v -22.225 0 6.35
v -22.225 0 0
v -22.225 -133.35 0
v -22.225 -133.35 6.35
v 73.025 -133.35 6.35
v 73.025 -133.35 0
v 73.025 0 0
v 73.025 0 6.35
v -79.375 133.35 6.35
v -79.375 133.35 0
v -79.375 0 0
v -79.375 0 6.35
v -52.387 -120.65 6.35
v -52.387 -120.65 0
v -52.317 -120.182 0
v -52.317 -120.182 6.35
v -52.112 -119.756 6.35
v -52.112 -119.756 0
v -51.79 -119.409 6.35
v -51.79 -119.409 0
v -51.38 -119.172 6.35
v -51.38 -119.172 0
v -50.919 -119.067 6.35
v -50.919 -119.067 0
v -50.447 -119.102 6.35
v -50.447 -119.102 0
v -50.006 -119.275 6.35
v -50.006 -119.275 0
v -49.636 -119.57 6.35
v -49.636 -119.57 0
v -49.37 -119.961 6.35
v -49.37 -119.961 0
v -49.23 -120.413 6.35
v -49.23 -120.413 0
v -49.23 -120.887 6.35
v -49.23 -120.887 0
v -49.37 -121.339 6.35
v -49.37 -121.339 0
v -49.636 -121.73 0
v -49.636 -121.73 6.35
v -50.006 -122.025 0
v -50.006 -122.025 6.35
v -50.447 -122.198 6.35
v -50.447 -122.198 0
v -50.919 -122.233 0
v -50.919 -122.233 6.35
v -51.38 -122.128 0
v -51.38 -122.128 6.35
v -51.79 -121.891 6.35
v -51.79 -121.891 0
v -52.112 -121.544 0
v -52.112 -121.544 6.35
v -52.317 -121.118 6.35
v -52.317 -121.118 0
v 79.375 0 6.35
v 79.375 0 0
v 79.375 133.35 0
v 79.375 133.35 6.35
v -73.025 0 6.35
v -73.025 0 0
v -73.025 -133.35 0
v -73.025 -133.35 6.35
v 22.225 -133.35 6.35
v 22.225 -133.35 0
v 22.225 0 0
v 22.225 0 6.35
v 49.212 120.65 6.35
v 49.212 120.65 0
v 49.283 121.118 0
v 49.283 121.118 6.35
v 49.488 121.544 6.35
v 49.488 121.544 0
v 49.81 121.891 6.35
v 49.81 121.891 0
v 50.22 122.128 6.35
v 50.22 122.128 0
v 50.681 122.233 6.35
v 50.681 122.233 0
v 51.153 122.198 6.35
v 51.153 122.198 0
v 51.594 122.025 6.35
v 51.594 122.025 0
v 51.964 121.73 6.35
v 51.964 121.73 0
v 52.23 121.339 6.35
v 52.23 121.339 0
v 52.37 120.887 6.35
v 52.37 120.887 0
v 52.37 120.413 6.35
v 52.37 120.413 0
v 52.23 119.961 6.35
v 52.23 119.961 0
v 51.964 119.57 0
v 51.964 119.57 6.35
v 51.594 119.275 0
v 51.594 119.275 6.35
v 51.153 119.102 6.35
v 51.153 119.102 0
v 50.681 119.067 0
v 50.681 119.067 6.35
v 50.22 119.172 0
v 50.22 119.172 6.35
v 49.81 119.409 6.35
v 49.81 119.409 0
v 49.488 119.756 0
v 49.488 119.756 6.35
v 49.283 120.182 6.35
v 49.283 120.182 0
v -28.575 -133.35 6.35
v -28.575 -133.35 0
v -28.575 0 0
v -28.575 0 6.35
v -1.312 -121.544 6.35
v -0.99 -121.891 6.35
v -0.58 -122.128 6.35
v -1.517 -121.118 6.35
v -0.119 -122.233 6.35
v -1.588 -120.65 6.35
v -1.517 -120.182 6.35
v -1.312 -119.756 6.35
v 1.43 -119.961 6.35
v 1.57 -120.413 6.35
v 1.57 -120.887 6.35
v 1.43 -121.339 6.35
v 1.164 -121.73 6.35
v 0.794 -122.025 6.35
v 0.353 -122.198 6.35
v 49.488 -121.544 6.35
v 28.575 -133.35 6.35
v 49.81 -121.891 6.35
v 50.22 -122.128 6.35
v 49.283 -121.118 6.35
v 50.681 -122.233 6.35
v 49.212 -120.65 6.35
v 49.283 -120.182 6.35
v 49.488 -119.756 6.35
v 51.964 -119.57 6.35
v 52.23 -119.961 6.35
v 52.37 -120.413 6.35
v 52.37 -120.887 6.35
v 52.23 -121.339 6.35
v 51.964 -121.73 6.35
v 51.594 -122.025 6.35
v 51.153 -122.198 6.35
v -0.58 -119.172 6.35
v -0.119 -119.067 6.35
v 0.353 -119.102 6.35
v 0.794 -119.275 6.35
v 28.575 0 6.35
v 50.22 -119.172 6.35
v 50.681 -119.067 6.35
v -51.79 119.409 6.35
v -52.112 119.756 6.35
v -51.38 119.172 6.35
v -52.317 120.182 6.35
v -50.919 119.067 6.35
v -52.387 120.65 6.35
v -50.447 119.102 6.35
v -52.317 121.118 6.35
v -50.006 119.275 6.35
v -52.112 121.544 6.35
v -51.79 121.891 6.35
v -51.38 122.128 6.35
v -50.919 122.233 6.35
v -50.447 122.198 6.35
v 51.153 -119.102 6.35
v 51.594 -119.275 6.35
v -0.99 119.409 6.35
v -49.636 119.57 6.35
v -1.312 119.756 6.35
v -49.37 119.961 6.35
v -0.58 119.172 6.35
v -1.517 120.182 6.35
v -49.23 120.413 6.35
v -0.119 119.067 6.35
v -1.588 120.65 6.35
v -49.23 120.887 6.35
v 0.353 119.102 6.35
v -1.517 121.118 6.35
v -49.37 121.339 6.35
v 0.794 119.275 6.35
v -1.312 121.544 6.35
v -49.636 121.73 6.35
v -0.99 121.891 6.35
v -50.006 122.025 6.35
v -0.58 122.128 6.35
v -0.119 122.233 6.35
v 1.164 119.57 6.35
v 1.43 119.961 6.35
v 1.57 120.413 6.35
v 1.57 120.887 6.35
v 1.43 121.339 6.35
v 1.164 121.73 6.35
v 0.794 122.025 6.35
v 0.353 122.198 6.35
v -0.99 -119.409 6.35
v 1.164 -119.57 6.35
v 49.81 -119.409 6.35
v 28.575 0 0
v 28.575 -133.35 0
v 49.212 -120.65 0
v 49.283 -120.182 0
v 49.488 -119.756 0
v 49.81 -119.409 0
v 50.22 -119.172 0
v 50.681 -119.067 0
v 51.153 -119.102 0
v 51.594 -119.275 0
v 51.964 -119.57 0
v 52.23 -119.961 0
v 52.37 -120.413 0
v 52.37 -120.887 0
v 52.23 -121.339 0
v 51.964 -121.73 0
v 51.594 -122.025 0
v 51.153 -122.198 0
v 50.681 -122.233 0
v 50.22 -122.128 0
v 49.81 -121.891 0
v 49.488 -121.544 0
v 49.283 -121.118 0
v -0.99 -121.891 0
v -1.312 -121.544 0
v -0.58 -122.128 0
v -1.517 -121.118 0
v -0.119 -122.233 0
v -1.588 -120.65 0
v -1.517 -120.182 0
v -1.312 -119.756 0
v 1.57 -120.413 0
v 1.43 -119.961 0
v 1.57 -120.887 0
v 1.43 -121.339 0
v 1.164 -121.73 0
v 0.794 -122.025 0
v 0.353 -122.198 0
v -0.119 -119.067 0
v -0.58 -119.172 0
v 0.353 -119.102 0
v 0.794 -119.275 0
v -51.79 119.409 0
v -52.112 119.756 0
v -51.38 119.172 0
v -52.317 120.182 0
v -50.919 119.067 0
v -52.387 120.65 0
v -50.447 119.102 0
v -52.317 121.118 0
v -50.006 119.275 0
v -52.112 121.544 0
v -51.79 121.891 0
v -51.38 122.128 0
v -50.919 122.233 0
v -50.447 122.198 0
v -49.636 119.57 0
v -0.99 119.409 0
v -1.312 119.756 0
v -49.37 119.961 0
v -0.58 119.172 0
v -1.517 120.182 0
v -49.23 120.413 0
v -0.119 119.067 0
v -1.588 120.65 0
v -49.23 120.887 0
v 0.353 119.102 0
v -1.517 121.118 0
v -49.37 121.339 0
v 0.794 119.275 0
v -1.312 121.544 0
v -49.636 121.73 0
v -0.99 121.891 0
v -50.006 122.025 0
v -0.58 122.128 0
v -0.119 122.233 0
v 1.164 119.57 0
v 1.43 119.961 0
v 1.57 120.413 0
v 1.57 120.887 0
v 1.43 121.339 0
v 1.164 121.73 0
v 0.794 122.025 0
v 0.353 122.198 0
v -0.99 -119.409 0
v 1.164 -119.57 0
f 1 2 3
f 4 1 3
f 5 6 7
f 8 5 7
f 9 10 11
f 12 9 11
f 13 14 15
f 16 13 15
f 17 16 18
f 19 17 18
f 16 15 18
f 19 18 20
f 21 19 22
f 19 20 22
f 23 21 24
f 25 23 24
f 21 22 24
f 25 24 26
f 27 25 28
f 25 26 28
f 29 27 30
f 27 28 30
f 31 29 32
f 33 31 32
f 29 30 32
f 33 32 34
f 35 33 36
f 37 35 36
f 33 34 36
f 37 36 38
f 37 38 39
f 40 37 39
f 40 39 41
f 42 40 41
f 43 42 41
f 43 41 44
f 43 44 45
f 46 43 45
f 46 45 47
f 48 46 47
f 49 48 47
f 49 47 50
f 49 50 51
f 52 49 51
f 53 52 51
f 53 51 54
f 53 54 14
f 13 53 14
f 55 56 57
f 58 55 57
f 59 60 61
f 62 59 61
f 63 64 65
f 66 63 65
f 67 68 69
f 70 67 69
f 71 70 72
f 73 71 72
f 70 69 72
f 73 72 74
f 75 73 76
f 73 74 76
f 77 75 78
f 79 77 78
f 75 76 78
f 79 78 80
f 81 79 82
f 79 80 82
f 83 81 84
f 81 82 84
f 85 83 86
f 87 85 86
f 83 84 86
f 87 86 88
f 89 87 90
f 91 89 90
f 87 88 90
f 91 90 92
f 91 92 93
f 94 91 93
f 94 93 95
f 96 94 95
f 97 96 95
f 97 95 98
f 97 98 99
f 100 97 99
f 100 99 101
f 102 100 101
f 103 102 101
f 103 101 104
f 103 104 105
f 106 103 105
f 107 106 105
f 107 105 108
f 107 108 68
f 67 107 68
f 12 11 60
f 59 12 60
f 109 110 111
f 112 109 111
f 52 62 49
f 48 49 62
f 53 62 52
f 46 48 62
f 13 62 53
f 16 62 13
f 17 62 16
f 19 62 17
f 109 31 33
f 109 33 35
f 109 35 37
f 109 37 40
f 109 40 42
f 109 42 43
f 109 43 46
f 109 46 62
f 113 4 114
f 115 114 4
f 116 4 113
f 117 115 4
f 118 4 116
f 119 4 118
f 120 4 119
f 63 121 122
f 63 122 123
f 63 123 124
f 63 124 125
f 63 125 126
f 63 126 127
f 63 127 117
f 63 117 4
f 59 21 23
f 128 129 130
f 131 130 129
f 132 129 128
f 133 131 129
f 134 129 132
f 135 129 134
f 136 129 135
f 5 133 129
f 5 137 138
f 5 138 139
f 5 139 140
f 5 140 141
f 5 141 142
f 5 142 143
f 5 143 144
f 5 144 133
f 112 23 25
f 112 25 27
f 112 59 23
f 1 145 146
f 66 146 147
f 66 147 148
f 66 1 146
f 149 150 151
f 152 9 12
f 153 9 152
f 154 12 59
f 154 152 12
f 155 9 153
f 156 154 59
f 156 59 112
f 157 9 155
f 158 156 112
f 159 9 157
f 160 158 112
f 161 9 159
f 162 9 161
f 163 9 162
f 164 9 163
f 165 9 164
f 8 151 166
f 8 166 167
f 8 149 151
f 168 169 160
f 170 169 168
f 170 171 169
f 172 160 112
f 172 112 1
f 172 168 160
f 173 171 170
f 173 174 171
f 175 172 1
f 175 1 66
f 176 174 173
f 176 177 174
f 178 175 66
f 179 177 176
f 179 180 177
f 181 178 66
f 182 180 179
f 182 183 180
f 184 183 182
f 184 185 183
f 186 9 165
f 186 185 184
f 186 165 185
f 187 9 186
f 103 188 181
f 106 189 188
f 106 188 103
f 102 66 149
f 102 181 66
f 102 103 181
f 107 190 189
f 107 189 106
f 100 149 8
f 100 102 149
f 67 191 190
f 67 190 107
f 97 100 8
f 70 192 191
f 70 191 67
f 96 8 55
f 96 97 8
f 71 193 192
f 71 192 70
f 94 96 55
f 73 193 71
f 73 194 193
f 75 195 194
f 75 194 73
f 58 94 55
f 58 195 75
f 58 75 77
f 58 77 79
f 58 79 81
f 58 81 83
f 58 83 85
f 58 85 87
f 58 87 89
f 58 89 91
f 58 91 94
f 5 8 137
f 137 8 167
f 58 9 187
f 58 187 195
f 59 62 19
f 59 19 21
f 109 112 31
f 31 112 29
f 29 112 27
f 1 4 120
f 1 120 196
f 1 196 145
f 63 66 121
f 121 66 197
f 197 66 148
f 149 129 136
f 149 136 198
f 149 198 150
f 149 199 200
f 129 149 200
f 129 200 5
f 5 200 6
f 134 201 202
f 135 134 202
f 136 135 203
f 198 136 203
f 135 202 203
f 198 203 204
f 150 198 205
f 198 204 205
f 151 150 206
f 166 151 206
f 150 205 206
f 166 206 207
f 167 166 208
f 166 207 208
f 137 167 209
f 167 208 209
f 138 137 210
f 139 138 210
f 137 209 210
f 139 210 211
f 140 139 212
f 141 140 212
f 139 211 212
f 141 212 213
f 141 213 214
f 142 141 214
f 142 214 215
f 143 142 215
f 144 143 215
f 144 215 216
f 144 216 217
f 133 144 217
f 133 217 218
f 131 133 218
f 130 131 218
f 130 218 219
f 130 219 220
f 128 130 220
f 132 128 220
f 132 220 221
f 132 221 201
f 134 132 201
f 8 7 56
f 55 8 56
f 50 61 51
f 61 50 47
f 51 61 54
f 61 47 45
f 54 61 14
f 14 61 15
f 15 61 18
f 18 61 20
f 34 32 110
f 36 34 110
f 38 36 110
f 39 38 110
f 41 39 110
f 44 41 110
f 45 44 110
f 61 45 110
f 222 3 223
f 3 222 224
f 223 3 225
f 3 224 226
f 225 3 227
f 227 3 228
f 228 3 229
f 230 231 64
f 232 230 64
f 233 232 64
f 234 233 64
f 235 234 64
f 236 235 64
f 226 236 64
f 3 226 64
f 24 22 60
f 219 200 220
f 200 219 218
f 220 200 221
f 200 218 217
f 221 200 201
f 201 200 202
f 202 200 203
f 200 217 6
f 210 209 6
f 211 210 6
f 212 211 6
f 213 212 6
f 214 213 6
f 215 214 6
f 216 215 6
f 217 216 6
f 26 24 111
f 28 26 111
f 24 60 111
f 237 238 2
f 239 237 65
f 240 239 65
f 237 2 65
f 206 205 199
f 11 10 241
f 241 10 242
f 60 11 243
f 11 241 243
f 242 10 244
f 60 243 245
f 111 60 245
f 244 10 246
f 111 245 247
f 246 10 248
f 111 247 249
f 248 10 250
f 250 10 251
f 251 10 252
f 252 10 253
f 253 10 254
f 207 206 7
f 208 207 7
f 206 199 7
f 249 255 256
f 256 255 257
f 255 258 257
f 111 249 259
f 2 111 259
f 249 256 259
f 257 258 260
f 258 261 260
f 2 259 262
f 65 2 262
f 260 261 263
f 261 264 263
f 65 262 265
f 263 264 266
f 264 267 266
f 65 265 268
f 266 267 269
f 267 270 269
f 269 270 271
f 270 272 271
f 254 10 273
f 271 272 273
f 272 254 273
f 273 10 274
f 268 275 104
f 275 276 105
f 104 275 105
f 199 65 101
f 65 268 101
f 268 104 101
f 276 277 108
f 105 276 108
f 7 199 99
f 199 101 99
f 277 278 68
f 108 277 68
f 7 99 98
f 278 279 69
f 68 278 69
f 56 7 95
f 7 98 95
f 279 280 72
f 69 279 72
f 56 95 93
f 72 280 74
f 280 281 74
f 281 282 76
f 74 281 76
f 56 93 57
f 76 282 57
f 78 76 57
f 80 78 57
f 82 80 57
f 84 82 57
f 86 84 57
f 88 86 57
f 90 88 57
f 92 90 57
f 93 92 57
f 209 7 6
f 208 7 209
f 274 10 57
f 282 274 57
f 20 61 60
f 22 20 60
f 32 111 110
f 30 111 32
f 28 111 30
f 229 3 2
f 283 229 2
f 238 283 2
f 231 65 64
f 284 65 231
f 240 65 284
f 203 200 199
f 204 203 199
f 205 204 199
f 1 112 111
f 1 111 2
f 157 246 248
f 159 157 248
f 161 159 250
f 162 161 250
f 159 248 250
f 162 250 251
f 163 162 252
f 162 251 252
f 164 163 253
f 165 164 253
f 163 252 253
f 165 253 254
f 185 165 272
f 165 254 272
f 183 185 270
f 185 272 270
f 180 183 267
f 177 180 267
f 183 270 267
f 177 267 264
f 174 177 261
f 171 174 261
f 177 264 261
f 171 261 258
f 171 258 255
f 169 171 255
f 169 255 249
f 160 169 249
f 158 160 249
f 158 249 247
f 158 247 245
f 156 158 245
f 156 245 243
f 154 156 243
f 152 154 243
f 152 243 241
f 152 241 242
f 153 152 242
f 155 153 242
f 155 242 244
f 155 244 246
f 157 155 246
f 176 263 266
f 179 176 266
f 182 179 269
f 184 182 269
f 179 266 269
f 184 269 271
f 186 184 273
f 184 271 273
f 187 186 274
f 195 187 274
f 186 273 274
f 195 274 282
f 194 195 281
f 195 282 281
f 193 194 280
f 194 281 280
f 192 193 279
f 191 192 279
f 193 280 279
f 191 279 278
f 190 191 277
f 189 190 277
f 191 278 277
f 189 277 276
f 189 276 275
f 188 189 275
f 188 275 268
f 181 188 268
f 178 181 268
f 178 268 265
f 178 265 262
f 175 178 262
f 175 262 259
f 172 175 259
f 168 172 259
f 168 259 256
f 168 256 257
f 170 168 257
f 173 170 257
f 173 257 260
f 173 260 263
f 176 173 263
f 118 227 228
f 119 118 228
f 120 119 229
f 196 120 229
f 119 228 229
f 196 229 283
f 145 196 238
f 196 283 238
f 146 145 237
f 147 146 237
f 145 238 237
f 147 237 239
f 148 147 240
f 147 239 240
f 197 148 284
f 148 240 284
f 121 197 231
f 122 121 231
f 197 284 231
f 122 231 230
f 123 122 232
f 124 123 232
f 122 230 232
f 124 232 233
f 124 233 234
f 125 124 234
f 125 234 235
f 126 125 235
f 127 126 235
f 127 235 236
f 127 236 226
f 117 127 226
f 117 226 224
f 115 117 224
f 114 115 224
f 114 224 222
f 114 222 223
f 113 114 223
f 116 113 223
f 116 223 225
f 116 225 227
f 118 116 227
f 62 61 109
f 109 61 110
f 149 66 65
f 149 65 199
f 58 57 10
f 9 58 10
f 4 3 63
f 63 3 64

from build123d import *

# Parameters (mm, degrees)
F0_W     = 22.225
F0_H     = 120.65
F1_DEPTH = 6.35
F3_D     = 3.175


# Not quite as in the source:
# - a feature names something its author has since deleted; it is built from what else it names


with BuildPart() as f1:
    # F0 (on Top) → F1 (new body)
    with BuildSketch(Plane.XY):
        Polygon((73.025, 133.35), (-73.025, 133.35), (-73.025, 120.65), (-50.8, 120.65), (0, 120.65), (50.8, 120.65), (73.025, 120.65), align=None)
        Polygon((-50.8, -120.65), (-73.025, -120.65), (-73.025, -133.35), (-28.575, -133.35), (-28.575, -120.65), align=None)
        Polygon((73.025, -133.35), (73.025, -120.65), (50.8, -120.65), (28.575, -120.65), (28.575, -133.35), align=None)
        with Locations((-61.9125, 60.325)):
            Rectangle(F0_W, F0_H)
        with Locations((-61.9125, -60.325)):
            Rectangle(F0_W, F0_H)
        with Locations((61.9125, 60.325)):
            Rectangle(F0_W, F0_H)
        with Locations((61.9125, -60.325)):
            Rectangle(F0_W, F0_H)
        Polygon((50.8, 0), (50.8, 120.65), (0, 120.65), (0, 0), (22.225, 0), (28.575, 0), align=None)
        Polygon((22.225, -120.65), (0, -120.65), (-22.225, -120.65), (-22.225, -133.35), (22.225, -133.35), align=None)
        Polygon((0, 120.65), (-50.8, 120.65), (-50.8, 0), (-28.575, 0), (-22.225, 0), (0, 0), align=None)
        with Locations((-39.6875, -60.325)):
            Rectangle(F0_W, F0_H)
        with Locations((-11.1125, -60.325)):
            Rectangle(F0_W, F0_H)
        with Locations((11.1125, -60.325)):
            Rectangle(F0_W, F0_H)
        with Locations((39.6875, -60.325)):
            Rectangle(F0_W, F0_H)
        Polygon((79.375, 133.35), (73.025, 133.35), (73.025, 120.65), (73.025, 0), (79.375, 0), align=None)
        Polygon((-73.025, 120.65), (-73.025, 133.35), (-79.375, 133.35), (-79.375, 0), (-73.025, 0), align=None)
    extrude(amount=F1_DEPTH)

    # F3 (through all)
    with Locations(Plane.XY.offset(6.35)):
        with Locations((-50.8, 120.65), (0, 120.65), (50.8, 120.65), (50.8, -120.65), (0, -120.65), (-50.8, -120.65)):
            Hole(F3_D / 2)


solid = f1.part
